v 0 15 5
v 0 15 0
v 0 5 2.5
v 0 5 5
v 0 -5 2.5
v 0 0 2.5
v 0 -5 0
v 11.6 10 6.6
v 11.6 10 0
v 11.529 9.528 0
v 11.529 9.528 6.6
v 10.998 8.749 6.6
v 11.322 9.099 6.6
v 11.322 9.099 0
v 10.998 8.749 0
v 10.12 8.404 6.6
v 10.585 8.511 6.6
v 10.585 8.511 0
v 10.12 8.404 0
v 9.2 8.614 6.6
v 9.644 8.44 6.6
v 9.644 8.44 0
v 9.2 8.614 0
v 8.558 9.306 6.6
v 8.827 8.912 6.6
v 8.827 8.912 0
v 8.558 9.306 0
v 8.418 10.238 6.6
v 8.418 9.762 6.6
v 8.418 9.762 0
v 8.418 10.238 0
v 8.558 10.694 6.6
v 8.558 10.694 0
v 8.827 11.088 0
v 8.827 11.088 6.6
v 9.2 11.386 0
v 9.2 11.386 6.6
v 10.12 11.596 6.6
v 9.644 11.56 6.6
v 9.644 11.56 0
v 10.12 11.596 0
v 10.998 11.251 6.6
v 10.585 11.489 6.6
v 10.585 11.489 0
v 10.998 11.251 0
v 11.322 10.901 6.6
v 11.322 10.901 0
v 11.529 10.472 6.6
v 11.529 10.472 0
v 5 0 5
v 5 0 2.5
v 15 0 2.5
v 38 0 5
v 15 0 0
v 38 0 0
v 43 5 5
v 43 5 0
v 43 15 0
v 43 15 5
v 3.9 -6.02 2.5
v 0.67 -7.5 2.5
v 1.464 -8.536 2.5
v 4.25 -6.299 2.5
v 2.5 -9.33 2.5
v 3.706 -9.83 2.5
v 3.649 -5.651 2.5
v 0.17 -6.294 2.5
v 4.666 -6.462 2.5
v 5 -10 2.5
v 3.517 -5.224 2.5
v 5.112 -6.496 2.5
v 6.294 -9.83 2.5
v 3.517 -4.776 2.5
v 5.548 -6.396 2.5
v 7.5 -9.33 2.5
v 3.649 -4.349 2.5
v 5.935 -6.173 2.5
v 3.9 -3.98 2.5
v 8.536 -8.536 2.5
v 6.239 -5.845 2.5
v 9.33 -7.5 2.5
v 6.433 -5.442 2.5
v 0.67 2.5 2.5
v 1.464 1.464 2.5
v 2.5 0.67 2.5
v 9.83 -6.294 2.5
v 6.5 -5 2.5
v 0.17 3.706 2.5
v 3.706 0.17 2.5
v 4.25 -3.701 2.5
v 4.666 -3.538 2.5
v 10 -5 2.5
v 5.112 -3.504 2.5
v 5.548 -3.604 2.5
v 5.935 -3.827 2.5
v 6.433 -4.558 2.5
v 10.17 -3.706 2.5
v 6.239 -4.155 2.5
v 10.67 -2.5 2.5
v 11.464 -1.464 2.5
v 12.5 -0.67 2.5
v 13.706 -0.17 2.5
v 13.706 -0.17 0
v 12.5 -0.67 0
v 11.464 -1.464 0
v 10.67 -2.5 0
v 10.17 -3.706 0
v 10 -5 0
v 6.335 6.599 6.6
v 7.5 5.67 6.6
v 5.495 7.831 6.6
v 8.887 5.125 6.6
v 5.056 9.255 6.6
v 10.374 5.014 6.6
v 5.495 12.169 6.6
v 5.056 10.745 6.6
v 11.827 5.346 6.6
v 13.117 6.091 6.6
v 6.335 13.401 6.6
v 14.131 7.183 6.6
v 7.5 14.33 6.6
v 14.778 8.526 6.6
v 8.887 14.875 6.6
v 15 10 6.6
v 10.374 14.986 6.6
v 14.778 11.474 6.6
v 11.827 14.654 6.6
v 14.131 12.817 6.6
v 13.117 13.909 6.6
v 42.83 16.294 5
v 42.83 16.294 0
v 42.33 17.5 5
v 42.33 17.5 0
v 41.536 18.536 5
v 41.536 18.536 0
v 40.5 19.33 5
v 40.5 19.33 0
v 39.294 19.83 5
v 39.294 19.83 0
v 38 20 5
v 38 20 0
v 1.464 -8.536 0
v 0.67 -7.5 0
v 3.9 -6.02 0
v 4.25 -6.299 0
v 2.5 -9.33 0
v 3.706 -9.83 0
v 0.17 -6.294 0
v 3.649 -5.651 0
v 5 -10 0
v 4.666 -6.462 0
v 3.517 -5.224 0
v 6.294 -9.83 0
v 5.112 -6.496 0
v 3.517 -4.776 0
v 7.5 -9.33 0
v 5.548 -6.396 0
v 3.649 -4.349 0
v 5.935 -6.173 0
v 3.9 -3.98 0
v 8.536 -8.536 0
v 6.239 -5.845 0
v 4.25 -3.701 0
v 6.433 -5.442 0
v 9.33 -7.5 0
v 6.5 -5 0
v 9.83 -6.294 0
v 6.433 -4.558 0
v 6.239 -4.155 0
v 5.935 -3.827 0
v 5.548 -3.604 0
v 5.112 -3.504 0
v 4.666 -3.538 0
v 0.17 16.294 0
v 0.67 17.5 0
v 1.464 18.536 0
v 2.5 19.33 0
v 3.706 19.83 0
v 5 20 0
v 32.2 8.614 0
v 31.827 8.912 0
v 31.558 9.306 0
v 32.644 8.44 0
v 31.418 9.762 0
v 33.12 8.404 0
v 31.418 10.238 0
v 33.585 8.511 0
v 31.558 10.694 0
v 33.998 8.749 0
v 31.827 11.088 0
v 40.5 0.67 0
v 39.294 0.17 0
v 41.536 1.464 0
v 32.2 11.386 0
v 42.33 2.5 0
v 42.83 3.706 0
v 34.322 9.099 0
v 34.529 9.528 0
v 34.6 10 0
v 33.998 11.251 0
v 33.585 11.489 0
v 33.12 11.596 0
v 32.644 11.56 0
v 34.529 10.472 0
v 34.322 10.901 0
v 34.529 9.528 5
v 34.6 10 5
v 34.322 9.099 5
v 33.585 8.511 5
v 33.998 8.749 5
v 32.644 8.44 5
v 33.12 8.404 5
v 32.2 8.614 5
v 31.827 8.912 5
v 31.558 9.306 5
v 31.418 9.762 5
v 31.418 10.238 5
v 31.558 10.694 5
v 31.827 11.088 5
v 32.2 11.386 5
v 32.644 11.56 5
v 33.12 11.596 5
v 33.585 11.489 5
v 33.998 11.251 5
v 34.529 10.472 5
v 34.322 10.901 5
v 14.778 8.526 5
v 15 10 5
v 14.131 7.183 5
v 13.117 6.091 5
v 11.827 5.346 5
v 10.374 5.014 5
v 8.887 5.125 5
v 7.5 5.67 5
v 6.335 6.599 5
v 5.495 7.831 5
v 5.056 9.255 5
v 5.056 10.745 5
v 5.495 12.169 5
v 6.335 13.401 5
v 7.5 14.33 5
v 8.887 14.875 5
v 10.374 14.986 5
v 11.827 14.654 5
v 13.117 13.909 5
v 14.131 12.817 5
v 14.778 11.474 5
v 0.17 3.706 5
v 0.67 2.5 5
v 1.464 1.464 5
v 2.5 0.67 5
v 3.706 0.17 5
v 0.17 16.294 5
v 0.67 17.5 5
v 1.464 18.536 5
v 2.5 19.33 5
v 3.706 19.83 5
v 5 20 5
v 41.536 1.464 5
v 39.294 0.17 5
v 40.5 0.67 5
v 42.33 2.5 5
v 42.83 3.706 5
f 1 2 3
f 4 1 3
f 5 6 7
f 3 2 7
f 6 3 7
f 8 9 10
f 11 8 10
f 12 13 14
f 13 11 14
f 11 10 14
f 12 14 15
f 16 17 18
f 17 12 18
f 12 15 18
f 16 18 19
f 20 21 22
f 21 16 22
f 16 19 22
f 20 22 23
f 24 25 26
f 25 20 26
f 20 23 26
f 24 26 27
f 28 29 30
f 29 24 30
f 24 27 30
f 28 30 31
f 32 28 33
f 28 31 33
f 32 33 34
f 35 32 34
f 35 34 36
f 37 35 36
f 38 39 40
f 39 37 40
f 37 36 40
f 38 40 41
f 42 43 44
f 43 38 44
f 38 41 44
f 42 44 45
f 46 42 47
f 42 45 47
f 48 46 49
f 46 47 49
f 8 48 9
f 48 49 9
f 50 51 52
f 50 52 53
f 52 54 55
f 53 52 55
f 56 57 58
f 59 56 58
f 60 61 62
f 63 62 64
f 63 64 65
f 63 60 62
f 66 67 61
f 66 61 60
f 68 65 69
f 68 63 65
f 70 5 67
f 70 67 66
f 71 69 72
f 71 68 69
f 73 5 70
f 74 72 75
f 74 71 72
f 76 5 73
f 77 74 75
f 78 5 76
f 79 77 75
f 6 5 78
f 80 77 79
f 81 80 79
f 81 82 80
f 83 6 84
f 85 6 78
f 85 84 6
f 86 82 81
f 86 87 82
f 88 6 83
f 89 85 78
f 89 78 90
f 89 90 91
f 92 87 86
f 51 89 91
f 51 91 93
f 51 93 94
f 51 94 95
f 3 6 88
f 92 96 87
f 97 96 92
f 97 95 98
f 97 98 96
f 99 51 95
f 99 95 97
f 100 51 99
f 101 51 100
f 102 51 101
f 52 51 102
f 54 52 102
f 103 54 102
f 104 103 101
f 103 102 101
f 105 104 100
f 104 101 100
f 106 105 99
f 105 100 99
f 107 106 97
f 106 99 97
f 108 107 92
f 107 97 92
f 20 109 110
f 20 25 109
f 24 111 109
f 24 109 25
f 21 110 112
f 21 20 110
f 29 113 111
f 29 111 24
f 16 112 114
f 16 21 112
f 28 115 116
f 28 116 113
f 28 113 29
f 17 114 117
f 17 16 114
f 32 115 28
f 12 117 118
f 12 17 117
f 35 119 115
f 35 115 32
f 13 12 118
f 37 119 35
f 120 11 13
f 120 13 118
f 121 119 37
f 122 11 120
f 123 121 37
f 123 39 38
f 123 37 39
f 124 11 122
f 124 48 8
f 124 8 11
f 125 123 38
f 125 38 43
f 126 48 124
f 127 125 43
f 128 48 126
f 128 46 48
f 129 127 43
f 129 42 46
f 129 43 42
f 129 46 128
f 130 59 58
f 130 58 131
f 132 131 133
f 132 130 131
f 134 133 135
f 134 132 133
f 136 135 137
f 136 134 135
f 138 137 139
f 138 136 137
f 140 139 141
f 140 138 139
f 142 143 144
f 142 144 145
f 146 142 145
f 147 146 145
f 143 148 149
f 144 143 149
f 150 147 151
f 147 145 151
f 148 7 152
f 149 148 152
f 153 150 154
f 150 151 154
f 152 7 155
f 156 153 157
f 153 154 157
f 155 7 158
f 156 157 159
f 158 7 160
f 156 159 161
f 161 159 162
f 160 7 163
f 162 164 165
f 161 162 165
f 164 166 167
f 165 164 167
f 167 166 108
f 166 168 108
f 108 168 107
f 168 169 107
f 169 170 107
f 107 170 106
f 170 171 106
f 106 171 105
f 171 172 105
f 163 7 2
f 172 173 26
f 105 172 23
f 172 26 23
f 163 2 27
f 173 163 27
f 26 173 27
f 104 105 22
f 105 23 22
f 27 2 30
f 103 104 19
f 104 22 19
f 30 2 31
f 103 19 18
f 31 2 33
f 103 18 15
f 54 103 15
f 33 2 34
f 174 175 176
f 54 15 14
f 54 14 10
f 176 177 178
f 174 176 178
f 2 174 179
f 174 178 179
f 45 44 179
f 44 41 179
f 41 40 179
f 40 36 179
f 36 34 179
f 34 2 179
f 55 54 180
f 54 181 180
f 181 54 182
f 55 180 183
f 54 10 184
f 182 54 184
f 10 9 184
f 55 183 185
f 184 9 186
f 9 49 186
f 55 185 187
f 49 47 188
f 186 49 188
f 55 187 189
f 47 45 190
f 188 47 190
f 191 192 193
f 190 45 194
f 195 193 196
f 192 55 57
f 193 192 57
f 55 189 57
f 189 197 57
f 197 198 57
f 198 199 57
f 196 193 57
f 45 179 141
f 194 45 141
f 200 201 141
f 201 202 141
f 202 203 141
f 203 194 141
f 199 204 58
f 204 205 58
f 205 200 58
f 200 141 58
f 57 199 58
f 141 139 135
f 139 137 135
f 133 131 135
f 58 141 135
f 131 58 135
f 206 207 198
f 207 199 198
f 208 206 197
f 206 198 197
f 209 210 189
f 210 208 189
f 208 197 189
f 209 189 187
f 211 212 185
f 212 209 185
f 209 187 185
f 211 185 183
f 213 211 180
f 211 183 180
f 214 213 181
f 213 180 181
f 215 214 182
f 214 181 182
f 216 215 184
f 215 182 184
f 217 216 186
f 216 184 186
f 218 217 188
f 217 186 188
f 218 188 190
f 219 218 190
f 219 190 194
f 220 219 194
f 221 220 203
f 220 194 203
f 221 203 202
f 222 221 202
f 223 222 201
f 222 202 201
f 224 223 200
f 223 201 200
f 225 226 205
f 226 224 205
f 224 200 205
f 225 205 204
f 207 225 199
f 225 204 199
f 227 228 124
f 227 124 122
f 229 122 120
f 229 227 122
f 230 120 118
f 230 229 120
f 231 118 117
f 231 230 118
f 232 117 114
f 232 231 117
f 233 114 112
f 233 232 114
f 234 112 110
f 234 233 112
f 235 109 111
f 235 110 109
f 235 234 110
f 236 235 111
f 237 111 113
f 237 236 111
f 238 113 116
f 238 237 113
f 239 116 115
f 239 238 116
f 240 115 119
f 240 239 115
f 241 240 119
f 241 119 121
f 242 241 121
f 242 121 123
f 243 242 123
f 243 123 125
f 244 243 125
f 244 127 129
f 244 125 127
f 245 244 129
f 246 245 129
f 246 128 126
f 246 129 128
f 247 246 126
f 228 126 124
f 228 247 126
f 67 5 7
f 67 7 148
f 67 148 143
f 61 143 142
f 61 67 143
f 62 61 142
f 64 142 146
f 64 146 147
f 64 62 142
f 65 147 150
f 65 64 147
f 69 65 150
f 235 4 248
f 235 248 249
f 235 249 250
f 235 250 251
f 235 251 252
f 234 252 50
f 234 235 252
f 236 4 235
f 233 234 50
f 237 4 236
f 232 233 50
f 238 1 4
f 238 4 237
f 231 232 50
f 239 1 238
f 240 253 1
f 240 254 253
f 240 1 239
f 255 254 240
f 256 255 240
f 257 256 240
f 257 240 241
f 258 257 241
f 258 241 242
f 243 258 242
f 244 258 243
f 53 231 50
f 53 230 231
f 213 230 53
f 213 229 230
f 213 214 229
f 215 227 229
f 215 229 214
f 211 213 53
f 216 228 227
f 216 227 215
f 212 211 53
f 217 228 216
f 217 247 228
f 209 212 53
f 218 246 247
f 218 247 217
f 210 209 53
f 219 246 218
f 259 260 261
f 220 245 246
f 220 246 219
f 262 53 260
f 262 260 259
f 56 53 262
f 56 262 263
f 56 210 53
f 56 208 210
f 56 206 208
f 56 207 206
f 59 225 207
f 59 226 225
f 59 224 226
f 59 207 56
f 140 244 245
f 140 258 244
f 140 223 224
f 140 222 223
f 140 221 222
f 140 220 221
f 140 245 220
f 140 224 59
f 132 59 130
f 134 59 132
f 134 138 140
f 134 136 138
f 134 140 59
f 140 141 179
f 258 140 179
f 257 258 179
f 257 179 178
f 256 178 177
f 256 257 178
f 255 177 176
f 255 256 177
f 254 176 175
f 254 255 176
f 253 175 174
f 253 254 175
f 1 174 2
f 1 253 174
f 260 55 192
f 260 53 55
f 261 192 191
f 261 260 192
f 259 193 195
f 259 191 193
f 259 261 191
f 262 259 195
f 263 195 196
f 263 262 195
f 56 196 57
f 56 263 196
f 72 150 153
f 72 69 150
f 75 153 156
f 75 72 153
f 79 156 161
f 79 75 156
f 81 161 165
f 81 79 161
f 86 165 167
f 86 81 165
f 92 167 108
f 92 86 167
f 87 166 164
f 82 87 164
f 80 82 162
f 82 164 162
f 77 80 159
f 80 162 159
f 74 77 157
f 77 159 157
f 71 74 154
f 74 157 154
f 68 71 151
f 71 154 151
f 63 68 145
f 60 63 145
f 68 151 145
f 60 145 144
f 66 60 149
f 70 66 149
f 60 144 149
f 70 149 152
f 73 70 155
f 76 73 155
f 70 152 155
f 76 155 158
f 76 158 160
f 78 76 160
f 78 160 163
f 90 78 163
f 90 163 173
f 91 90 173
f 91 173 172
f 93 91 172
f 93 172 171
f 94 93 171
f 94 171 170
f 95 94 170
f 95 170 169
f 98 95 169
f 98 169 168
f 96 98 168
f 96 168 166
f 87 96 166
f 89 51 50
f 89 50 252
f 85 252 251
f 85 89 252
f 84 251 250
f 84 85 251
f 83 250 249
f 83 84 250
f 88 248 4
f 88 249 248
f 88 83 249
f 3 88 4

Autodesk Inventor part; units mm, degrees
ref_plane "YZ Plane" through (0, 0, 0) normal (1, 0, 0) x (0, 1, 0)
ref_plane "XZ Plane" through (0, 0, 0) normal (0, 1, 0) x (-1, 0, 0)
ref_plane "XY Plane" through (0, 0, 0) normal (0, 0, 1) x (1, 0, 0)
sketch "Sketch1" plane through (0, 0, 0) normal (0, 0, 1) x (1, 0, 0)
  line L0 (0, 0) -> (43, 0)
  line L1 (43, 0) -> (43, 20)
  line L2 (43, 20) -> (0, 20)
  line L3 (0, 20) -> (0, 0)
  circle A0 centre (10, 10) radius 1.6
  circle A1 centre (33, 10) radius 1.6
  line L4 (0, -10) -> (10, -10)
  line L5 (10, -10) -> (10, 0)
  line L6 (10, 0) -> (0, 0)
  line L7 (0, 0) -> (0, -10)
  circle A2 centre (5, -5) radius 1.5
  point P0 (0, 10)
  point P1 (0, -5)
  point P2 (5, 0)
  dimension "d2" = 20
  dimension "d3" = 3.2
  dimension "d4" = 3.2
  dimension "d5" = 10
  dimension "d6" = 10
  dimension "d10" = 23
  dimension "d15" = 10
  dimension "d16" = 10
  dimension "d17" = 3
extrude "Extrusion1" add sketch "Sketch1" along normal blind 5
sketch "Sketch2" plane through (0, 0, 5) normal (0, 0, 1) x (1, 0, 0)
  circle A0 centre (10, 10) radius 1.6 projected
  circle A1 centre (10, 10) radius 5
  point P0 (0, 0)
  dimension "d11" = 10
extrude "Extrusion2" add sketch "Sketch2" along normal blind 1.6
fillet "Fillet2" radius 5 6 edges at (43, 20, 2.5) (43, 0, 2.5) (10, -10, 2.5) (0, -10, 2.5) (10, 0, 2.5) (0, 20, 2.5)
sketch "Sketch3" plane through (0, 0, 5) normal (0, 0, 1) x (1, 0, 0)
  line L0 (0, 0) -> (16.7828, 0)
  line L1 (16.7828, 0) -> (16.7828, -11.2372)
  line L2 (16.7828, -11.2372) -> (0, -11.2372)
  line L3 (0, -11.2372) -> (0, 0)
extrude "Extrusion3" cut sketch "Sketch3" against normal blind 2.5
fillet "Fillet3" radius 5 1 edges at (0, 0, 3.75)
properties part number "wheel tensioner"
